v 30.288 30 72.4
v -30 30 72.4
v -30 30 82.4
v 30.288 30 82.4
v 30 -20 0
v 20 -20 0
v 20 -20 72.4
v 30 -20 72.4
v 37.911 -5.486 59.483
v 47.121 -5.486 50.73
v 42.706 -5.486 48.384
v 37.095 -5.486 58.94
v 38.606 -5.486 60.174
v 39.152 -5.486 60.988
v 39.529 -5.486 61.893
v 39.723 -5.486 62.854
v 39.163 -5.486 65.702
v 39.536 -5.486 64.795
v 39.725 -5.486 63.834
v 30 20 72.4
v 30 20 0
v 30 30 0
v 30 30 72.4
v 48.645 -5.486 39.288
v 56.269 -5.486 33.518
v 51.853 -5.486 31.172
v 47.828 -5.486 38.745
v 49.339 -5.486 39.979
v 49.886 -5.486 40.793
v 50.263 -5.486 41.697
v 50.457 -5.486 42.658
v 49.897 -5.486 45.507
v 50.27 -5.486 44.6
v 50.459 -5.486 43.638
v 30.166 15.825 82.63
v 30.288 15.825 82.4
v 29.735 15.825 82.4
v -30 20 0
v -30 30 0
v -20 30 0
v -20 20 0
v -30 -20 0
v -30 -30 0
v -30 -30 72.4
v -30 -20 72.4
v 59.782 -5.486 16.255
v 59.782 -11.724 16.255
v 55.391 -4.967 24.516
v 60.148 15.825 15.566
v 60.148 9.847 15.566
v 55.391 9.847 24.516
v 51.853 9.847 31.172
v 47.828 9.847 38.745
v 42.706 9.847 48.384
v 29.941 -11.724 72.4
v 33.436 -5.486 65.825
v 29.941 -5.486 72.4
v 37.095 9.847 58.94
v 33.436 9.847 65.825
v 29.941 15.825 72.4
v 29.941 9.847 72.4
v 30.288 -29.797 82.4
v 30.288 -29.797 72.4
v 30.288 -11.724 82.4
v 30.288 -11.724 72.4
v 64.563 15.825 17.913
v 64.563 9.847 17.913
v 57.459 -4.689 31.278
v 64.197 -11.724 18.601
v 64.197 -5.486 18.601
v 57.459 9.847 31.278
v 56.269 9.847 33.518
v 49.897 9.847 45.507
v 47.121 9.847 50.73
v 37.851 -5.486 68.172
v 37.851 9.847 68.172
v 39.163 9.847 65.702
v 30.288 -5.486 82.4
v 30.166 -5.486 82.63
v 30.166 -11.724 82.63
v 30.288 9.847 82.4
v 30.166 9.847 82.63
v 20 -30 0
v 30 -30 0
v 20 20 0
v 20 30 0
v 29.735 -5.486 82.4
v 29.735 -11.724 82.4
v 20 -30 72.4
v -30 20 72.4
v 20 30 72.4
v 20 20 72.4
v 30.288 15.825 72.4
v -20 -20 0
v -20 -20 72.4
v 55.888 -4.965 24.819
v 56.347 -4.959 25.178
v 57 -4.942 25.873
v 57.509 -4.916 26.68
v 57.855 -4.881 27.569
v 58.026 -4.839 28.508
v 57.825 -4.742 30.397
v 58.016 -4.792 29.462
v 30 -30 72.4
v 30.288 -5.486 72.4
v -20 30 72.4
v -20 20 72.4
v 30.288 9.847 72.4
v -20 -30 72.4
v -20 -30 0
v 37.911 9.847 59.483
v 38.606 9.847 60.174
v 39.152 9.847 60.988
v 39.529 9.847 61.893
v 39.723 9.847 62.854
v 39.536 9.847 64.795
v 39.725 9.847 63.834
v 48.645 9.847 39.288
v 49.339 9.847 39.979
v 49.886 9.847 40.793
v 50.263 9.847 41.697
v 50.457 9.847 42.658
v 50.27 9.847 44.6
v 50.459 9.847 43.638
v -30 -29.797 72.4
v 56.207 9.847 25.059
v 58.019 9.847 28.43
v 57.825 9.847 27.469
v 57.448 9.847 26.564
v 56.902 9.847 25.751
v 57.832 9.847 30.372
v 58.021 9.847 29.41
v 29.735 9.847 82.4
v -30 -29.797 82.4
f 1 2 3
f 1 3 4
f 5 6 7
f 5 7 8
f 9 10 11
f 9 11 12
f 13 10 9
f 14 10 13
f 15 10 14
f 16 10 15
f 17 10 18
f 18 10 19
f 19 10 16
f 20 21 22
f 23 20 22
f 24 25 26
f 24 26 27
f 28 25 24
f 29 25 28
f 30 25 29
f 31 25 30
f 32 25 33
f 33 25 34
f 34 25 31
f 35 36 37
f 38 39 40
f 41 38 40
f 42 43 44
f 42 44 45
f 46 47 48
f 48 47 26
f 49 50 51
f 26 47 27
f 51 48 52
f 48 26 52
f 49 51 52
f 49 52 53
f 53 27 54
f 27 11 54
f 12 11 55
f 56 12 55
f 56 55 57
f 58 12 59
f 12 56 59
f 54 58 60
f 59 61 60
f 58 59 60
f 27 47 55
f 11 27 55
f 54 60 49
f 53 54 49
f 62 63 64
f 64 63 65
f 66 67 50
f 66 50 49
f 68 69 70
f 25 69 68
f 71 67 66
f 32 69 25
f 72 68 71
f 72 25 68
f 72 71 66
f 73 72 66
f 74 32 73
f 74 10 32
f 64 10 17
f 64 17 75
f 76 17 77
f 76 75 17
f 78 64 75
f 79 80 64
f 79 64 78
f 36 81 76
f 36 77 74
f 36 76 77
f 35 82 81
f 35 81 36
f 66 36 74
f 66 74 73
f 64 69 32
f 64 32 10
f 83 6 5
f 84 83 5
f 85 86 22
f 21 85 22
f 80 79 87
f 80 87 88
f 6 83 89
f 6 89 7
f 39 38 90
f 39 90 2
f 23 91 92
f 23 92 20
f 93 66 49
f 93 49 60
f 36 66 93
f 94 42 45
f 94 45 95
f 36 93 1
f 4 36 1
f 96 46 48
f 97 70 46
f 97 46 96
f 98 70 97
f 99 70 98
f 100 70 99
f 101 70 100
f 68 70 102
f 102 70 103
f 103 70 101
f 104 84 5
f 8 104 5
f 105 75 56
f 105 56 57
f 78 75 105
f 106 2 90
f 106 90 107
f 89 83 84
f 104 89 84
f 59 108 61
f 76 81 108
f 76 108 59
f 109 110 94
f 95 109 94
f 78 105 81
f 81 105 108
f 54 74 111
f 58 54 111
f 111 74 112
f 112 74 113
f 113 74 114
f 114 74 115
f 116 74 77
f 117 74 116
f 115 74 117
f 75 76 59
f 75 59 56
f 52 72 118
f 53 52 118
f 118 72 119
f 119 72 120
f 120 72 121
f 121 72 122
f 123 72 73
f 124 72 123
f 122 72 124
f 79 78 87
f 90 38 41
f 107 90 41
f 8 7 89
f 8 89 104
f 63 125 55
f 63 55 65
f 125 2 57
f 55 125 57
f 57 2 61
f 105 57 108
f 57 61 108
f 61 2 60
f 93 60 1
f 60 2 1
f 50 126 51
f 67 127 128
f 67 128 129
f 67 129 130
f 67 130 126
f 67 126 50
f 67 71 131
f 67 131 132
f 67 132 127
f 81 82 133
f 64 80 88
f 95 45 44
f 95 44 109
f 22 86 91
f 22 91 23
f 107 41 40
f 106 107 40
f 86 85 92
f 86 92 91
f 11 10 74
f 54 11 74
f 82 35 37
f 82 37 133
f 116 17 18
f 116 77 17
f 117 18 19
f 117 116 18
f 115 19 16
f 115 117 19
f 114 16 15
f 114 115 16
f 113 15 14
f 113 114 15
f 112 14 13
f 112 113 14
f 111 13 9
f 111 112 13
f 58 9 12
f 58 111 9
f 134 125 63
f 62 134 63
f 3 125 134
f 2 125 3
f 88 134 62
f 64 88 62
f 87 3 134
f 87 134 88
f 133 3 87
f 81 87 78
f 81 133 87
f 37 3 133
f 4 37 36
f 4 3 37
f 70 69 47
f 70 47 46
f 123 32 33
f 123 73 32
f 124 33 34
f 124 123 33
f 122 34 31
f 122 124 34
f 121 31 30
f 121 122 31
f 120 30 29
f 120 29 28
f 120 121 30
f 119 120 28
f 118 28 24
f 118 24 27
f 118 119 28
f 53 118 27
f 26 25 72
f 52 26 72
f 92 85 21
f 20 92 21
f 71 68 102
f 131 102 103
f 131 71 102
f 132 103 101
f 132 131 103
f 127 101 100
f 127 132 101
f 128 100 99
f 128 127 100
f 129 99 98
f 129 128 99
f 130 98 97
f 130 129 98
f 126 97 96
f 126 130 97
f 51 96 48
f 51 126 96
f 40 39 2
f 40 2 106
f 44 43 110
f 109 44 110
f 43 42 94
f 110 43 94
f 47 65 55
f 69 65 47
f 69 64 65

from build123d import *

# Parameters (mm, degrees)
F0_W     = 10
F0_H     = 10
F1_DEPTH = 72.4
F2_W     = 60.2884615958
F2_H     = 59.7972988337
F3_DEPTH = 10
F5_W     = 15.3336008079
F5_H     = 8.5764247924
F5_H_2   = 11.9550051168
F6_DEPTH = 5
F7_R     = 4.99999


# Not quite as in the source:
# - a fillet or chamfer is up to 0.001 mm smaller than in the source, because OpenCascade refuses the exact size


with BuildPart() as f1:
    # F0 (on Top) → F1 (new body)
    with BuildSketch(Plane.XY):
        with Locations((25, 25)):
            Rectangle(F0_W, F0_H)
    extrude(amount=F1_DEPTH)


with BuildPart() as f1b:
    # F0 (on Top) → F1, piece 2 (new body)
    with BuildSketch(Plane.XY):
        with Locations((-25, 25)):
            Rectangle(F0_W, F0_H)
    extrude(amount=F1_DEPTH)


with BuildPart() as f1c:
    # F0 (on Top) → F1, piece 3 (new body)
    with BuildSketch(Plane.XY):
        with Locations((25, -25)):
            Rectangle(F0_W, F0_H)
    extrude(amount=F1_DEPTH)


with BuildPart() as f1d:
    # F0 (on Top) → F1, piece 4 (new body)
    with BuildSketch(Plane.XY):
        with Locations((-25, -25)):
            Rectangle(F0_W, F0_H)
    extrude(amount=F1_DEPTH)


with BuildPart() as f3:
    # F2 (on face) → F3 (new body)
    with BuildSketch(Plane.XY.offset(72.4)):
        with Locations((0.1442307979, 0.1013505831)):
            Rectangle(F2_W, F2_H)
    extrude(amount=F3_DEPTH)

    # F5 (on face) → F6 (join)
    with BuildSketch(Plane(origin=(57.7655486917, 0, 30.7018579048), x_dir=(0, 1, 0), z_dir=(0.8830276047, 0, 0.4693210514))):
        Polygon((-5.4863165133, 58.8063634932), (-11.7237139493, 58.8063634932), (-11.7237139493, -13.7033779174), (-5.4863165133, -13.7033779174), (-4.9665332772, -4.3472838588), (9.8472842947, -4.3472838588), (9.8472842947, -14.4830560312), (15.824791044, -14.4830560312), (15.824791044, 58.8063634932), (9.8472842947, 58.8063634932), (9.8472842947, 42.4331985414), (-5.4863165133, 42.4331985414), align=None)
        with Locations((2.1804838907, 7.4777789414)):
            Rectangle(F5_W, F5_H, mode=Mode.SUBTRACT)
        with Locations((2.1804838907, 28.6589427851)):
            Rectangle(F5_W, F5_H_2, mode=Mode.SUBTRACT)
    extrude(amount=-F6_DEPTH)

    # F7 (radius 5 in the source; OpenCascade refuses exactly that, so slightly less here)
    f7_edges = [f3.edges().sort_by_distance(p)[0] for p in [
        (41.509936, 2.180484, 61.286795),
        (52.243521, 2.180484, 41.091553),
        (59.805821, 2.440376, 26.863086),
    ]]
    fillet(f7_edges, radius=F7_R)


solid = Compound([f1.part, f1b.part, f1c.part, f1d.part, f3.part])
